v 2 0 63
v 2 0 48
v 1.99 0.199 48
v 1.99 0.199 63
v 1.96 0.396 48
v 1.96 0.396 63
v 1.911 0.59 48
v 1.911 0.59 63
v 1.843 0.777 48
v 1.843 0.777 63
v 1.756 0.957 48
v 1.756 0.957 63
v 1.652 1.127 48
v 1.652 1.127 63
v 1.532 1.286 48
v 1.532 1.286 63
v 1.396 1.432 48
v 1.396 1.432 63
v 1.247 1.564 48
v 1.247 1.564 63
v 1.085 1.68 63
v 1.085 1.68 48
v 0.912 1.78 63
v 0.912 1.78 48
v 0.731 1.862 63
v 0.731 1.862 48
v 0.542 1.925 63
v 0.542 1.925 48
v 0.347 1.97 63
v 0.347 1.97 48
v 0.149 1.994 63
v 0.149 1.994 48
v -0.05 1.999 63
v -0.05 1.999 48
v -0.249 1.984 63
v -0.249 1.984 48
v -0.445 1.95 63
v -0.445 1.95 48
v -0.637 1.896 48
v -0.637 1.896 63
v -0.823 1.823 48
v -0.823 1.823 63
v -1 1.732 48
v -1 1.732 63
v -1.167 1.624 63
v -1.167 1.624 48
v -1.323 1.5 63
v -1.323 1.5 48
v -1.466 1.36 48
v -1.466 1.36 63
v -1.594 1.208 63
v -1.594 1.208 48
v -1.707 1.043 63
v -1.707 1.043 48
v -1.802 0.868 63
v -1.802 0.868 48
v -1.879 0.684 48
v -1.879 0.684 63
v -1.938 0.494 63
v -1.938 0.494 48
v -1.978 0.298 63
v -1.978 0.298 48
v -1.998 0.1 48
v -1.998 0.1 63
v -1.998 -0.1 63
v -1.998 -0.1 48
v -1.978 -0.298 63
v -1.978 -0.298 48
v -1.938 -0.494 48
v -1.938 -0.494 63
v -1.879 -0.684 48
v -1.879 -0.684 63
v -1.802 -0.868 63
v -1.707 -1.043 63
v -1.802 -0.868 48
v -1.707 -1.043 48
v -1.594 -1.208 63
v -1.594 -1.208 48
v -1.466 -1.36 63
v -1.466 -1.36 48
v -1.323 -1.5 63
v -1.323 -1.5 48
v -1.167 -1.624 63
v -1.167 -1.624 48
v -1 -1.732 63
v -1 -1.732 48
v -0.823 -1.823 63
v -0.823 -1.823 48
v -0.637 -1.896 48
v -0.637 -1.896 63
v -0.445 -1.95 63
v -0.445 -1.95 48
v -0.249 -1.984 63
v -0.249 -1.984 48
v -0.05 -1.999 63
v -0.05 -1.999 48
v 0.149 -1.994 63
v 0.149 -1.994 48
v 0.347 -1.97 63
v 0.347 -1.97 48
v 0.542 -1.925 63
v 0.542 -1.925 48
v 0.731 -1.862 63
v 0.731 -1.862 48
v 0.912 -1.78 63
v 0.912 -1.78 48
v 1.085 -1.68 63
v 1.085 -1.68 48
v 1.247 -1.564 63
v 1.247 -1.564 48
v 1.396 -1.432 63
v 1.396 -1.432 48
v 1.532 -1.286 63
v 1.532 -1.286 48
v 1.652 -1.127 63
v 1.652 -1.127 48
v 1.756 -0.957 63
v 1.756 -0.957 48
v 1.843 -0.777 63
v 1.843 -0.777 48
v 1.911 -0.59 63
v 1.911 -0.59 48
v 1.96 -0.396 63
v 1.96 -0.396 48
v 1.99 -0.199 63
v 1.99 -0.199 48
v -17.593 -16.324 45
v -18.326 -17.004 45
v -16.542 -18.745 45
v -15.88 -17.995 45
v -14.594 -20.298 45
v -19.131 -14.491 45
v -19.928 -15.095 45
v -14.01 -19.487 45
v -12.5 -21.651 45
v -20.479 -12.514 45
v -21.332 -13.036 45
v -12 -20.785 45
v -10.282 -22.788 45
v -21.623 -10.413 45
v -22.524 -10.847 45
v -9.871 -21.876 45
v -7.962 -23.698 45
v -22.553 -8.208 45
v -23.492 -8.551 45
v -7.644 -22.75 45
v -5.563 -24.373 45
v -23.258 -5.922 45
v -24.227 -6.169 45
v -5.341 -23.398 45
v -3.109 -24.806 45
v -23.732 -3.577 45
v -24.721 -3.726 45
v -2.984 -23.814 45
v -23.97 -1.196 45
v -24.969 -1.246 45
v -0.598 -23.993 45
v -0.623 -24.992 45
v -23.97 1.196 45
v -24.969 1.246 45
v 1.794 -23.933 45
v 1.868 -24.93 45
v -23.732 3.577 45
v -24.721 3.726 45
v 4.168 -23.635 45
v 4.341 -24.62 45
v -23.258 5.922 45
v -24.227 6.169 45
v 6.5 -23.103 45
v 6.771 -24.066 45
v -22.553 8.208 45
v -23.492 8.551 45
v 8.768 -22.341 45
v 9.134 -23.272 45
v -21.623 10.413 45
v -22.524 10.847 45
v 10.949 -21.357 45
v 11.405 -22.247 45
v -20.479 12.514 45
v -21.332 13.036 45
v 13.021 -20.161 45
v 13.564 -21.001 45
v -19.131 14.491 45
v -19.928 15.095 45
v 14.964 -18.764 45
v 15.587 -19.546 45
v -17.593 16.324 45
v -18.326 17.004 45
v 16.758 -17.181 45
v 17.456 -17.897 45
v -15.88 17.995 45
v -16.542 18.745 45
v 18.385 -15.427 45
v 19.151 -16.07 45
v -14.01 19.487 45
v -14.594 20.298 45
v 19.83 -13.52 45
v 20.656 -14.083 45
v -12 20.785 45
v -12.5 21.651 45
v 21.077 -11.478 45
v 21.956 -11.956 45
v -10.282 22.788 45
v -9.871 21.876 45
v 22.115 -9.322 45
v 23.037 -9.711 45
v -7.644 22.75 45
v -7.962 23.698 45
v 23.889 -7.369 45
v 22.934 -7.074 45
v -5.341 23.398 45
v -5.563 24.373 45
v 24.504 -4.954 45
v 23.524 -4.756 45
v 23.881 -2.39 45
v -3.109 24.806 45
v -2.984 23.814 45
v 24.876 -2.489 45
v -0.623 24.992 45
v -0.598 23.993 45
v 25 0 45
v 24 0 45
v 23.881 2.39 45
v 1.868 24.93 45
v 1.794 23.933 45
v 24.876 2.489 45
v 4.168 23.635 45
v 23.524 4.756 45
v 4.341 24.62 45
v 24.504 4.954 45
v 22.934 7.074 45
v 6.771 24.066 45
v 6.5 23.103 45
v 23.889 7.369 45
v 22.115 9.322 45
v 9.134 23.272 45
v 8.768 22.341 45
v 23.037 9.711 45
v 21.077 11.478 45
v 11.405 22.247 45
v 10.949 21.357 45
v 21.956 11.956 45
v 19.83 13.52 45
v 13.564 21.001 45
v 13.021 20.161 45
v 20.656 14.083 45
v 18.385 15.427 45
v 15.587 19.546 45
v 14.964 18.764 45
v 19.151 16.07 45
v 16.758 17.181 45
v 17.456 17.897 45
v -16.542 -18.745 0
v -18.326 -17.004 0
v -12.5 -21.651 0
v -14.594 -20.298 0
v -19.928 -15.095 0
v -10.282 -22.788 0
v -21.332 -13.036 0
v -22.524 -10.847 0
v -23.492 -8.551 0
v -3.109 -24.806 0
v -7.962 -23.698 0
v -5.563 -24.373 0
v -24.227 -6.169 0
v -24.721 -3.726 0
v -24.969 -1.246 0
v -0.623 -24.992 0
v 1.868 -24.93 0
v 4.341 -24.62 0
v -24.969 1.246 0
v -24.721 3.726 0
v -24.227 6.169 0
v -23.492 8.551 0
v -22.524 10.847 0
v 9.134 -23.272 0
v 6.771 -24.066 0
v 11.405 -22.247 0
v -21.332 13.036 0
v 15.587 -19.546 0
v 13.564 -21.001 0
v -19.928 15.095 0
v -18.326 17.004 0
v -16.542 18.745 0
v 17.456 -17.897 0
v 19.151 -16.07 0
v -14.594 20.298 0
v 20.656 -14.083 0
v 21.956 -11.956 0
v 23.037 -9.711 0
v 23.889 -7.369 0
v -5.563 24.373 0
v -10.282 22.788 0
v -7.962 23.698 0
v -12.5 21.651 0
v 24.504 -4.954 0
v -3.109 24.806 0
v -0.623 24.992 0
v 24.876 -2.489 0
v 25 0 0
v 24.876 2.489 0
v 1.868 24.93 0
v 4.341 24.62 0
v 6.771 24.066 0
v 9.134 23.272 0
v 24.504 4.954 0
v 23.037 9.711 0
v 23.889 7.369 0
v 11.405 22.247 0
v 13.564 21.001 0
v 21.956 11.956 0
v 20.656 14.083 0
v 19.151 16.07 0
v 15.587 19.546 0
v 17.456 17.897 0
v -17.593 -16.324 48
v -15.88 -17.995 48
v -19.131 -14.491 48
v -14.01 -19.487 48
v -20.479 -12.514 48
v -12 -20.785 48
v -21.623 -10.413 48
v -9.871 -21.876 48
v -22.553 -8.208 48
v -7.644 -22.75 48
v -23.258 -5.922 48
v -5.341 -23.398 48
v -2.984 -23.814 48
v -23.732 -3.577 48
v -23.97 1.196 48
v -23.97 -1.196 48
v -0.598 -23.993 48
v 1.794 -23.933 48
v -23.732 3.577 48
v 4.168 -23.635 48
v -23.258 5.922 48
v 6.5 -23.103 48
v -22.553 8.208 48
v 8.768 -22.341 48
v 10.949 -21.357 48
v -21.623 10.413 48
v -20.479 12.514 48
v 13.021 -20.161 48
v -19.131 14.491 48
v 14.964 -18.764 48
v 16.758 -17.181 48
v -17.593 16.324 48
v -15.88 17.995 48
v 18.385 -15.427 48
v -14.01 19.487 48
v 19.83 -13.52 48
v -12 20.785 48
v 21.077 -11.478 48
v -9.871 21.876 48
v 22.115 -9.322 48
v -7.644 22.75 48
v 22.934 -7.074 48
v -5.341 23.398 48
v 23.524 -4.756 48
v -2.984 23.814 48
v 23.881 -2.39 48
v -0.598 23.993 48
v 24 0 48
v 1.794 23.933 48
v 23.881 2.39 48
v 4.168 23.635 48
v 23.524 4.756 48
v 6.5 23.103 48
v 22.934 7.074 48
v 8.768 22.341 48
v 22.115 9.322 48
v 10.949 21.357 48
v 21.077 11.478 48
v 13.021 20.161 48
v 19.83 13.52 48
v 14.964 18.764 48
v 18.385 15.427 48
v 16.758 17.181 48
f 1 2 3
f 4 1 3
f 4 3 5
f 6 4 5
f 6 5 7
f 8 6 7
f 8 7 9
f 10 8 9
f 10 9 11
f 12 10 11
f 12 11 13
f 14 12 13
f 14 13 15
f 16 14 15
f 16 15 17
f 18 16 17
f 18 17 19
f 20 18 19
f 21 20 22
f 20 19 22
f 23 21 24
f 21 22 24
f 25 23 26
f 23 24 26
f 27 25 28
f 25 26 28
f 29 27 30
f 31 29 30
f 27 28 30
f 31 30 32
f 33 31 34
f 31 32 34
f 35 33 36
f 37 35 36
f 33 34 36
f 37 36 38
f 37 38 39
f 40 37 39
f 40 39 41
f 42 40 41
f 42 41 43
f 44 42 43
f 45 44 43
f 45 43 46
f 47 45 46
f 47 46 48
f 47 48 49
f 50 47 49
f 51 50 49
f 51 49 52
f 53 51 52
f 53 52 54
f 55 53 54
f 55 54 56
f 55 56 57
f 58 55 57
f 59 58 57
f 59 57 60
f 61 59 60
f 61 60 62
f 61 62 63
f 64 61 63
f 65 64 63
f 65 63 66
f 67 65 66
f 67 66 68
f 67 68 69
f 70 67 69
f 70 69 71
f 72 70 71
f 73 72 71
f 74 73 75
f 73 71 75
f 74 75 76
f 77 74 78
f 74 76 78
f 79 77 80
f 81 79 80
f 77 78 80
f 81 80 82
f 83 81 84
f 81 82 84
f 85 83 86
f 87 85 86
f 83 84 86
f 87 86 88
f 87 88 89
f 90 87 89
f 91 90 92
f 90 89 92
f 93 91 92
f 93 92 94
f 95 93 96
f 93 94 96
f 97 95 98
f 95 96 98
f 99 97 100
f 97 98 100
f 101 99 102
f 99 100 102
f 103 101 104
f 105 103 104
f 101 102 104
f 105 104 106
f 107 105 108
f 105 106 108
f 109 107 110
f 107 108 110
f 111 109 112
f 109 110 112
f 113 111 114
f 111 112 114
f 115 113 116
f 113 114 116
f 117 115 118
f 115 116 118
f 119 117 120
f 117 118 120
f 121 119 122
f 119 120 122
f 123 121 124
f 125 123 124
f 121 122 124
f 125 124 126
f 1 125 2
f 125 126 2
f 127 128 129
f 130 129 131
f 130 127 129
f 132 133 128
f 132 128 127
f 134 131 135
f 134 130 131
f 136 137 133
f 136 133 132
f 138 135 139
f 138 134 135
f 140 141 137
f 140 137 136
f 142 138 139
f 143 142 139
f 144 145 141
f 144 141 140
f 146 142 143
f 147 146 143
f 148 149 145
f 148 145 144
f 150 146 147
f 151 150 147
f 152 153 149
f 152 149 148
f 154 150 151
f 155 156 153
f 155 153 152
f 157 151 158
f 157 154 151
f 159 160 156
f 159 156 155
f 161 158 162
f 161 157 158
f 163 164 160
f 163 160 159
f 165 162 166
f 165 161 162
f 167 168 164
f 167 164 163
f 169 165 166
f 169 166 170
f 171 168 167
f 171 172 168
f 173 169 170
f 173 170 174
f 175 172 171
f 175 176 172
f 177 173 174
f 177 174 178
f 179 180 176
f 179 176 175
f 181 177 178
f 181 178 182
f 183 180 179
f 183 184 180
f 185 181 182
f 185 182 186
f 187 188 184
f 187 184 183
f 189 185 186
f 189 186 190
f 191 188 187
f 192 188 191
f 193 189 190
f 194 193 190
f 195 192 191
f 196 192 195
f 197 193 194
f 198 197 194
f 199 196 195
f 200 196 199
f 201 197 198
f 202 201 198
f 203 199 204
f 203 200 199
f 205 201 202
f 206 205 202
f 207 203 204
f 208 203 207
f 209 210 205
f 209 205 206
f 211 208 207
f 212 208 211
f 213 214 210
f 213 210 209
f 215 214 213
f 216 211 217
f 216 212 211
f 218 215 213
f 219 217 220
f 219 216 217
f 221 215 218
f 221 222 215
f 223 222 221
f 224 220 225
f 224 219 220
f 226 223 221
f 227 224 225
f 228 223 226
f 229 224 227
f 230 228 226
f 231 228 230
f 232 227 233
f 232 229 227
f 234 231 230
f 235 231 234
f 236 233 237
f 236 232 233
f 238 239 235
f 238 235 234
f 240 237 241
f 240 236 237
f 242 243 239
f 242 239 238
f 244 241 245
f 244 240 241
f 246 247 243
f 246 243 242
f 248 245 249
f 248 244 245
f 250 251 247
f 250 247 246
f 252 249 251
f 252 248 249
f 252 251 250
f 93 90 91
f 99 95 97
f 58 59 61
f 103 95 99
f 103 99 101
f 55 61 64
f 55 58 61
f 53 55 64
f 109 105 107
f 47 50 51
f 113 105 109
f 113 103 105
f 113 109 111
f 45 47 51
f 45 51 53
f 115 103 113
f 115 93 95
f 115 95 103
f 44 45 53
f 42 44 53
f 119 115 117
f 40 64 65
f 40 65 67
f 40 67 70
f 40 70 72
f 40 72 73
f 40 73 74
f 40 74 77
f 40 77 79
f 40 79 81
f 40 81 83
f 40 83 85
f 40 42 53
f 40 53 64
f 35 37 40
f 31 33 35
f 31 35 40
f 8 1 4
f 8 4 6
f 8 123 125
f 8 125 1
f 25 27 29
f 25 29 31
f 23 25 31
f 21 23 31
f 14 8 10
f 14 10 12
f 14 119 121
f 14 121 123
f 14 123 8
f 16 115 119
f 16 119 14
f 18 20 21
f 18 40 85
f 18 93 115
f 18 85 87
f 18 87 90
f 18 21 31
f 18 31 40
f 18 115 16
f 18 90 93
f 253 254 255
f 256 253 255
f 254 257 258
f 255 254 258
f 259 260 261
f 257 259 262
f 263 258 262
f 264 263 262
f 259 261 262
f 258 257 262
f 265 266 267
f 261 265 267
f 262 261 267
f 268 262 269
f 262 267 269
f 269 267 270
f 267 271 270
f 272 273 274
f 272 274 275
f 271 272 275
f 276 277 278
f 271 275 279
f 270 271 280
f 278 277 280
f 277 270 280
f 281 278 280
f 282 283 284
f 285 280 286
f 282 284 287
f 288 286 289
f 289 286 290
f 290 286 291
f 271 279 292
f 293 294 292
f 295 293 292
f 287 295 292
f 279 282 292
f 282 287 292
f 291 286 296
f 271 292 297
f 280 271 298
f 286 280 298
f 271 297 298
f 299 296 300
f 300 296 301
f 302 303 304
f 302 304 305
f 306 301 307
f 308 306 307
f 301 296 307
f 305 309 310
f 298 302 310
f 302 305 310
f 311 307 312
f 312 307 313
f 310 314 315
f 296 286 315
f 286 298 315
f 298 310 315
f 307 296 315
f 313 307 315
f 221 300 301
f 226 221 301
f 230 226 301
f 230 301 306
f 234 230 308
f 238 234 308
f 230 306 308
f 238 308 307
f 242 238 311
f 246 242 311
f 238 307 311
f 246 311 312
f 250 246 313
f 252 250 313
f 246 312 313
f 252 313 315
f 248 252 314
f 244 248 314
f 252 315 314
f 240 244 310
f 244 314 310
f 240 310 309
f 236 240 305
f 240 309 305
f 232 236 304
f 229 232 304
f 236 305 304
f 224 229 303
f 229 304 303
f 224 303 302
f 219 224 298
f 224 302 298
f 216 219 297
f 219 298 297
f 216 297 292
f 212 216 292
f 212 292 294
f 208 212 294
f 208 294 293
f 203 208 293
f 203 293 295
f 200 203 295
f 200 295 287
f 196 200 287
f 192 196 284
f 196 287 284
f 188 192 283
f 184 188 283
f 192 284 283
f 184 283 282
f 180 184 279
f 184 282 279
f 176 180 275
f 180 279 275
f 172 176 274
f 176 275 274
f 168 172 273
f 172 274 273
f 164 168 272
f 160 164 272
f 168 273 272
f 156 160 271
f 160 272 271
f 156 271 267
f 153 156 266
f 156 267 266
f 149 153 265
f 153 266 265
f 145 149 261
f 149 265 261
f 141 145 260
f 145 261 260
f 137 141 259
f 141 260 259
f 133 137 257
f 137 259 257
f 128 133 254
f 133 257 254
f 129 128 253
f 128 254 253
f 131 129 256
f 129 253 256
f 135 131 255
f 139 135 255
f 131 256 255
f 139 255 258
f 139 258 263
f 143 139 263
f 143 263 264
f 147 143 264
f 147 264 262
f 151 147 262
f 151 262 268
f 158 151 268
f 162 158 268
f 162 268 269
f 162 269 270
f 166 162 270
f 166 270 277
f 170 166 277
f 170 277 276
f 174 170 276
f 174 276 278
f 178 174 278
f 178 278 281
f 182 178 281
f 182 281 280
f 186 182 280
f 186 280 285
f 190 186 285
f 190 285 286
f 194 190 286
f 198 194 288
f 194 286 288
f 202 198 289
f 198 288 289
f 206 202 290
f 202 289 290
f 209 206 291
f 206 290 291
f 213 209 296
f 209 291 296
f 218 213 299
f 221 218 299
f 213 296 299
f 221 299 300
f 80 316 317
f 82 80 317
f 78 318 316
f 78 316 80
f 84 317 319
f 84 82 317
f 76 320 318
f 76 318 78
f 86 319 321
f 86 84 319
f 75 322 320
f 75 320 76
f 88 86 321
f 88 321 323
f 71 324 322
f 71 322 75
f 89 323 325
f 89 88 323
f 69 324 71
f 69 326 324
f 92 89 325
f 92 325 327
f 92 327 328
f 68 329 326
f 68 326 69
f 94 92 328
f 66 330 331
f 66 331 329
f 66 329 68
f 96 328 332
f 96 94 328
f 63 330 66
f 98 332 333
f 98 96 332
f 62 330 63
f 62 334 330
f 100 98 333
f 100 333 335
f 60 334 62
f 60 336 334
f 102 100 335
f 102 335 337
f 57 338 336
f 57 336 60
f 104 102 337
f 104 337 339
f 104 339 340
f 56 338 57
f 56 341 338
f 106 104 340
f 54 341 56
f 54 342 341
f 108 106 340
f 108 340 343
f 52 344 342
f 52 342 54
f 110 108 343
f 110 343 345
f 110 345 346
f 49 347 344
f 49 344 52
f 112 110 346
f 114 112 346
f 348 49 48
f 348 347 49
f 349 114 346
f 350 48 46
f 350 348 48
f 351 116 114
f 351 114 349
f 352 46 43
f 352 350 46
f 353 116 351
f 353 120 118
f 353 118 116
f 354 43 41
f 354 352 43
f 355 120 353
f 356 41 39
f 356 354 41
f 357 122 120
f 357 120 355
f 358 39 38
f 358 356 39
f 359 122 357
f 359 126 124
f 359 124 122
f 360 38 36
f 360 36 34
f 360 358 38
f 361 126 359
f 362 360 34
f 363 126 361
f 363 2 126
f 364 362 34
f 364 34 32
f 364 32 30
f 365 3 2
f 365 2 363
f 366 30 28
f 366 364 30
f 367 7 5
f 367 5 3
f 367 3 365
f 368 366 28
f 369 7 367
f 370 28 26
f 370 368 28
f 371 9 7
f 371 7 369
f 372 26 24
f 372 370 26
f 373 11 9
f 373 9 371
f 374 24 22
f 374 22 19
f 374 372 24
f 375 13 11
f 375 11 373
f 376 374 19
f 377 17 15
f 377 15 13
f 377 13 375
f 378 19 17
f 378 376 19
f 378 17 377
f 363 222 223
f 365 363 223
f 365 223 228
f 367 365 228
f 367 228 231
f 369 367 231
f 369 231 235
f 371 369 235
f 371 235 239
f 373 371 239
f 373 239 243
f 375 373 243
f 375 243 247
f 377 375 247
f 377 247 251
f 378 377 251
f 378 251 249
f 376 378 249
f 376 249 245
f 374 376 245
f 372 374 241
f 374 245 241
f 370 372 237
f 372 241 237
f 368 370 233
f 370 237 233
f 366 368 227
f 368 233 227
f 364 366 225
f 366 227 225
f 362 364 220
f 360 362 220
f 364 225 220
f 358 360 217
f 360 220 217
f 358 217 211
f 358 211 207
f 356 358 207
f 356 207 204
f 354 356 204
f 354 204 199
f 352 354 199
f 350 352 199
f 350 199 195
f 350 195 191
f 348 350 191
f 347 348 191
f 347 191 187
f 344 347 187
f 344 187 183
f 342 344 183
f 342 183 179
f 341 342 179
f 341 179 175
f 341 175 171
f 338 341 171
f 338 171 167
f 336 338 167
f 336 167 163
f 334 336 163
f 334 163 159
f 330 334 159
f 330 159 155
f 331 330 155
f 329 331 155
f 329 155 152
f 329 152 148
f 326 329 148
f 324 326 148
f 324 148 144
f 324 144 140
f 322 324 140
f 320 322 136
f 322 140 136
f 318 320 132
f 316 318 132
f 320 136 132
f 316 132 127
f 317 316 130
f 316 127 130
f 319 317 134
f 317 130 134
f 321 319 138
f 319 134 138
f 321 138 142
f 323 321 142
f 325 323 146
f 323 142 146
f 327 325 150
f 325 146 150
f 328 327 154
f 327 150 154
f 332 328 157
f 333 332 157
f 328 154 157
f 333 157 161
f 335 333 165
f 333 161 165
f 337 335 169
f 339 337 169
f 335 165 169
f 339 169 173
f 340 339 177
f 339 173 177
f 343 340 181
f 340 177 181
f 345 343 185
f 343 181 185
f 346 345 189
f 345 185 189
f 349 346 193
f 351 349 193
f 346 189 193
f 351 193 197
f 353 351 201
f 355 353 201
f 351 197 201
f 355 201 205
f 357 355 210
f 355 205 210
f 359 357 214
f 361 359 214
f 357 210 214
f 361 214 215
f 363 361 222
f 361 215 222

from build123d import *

# Parameters (mm, degrees)
SKETCH1_R           = 25
BOSS_EXTRUDE1_DEPTH = 45
SKETCH2_R           = 24
BOSS_EXTRUDE2_DEPTH = 48
SKETCH3_R           = 2
BOSS_EXTRUDE3_DEPTH = 63


with BuildPart() as part:
    # Sketch1 → Boss-Extrude1 (new body)
    with BuildSketch(Plane.XY):
        Circle(SKETCH1_R)
    extrude(amount=BOSS_EXTRUDE1_DEPTH)

    # Sketch2 → Boss-Extrude2 (add)
    with BuildSketch(Plane.XY):
        Circle(SKETCH2_R)
    extrude(amount=BOSS_EXTRUDE2_DEPTH)

    # Sketch3 → Boss-Extrude3 (add)
    with BuildSketch(Plane.XY):
        Circle(SKETCH3_R)
    extrude(amount=BOSS_EXTRUDE3_DEPTH)


solid = part.part
